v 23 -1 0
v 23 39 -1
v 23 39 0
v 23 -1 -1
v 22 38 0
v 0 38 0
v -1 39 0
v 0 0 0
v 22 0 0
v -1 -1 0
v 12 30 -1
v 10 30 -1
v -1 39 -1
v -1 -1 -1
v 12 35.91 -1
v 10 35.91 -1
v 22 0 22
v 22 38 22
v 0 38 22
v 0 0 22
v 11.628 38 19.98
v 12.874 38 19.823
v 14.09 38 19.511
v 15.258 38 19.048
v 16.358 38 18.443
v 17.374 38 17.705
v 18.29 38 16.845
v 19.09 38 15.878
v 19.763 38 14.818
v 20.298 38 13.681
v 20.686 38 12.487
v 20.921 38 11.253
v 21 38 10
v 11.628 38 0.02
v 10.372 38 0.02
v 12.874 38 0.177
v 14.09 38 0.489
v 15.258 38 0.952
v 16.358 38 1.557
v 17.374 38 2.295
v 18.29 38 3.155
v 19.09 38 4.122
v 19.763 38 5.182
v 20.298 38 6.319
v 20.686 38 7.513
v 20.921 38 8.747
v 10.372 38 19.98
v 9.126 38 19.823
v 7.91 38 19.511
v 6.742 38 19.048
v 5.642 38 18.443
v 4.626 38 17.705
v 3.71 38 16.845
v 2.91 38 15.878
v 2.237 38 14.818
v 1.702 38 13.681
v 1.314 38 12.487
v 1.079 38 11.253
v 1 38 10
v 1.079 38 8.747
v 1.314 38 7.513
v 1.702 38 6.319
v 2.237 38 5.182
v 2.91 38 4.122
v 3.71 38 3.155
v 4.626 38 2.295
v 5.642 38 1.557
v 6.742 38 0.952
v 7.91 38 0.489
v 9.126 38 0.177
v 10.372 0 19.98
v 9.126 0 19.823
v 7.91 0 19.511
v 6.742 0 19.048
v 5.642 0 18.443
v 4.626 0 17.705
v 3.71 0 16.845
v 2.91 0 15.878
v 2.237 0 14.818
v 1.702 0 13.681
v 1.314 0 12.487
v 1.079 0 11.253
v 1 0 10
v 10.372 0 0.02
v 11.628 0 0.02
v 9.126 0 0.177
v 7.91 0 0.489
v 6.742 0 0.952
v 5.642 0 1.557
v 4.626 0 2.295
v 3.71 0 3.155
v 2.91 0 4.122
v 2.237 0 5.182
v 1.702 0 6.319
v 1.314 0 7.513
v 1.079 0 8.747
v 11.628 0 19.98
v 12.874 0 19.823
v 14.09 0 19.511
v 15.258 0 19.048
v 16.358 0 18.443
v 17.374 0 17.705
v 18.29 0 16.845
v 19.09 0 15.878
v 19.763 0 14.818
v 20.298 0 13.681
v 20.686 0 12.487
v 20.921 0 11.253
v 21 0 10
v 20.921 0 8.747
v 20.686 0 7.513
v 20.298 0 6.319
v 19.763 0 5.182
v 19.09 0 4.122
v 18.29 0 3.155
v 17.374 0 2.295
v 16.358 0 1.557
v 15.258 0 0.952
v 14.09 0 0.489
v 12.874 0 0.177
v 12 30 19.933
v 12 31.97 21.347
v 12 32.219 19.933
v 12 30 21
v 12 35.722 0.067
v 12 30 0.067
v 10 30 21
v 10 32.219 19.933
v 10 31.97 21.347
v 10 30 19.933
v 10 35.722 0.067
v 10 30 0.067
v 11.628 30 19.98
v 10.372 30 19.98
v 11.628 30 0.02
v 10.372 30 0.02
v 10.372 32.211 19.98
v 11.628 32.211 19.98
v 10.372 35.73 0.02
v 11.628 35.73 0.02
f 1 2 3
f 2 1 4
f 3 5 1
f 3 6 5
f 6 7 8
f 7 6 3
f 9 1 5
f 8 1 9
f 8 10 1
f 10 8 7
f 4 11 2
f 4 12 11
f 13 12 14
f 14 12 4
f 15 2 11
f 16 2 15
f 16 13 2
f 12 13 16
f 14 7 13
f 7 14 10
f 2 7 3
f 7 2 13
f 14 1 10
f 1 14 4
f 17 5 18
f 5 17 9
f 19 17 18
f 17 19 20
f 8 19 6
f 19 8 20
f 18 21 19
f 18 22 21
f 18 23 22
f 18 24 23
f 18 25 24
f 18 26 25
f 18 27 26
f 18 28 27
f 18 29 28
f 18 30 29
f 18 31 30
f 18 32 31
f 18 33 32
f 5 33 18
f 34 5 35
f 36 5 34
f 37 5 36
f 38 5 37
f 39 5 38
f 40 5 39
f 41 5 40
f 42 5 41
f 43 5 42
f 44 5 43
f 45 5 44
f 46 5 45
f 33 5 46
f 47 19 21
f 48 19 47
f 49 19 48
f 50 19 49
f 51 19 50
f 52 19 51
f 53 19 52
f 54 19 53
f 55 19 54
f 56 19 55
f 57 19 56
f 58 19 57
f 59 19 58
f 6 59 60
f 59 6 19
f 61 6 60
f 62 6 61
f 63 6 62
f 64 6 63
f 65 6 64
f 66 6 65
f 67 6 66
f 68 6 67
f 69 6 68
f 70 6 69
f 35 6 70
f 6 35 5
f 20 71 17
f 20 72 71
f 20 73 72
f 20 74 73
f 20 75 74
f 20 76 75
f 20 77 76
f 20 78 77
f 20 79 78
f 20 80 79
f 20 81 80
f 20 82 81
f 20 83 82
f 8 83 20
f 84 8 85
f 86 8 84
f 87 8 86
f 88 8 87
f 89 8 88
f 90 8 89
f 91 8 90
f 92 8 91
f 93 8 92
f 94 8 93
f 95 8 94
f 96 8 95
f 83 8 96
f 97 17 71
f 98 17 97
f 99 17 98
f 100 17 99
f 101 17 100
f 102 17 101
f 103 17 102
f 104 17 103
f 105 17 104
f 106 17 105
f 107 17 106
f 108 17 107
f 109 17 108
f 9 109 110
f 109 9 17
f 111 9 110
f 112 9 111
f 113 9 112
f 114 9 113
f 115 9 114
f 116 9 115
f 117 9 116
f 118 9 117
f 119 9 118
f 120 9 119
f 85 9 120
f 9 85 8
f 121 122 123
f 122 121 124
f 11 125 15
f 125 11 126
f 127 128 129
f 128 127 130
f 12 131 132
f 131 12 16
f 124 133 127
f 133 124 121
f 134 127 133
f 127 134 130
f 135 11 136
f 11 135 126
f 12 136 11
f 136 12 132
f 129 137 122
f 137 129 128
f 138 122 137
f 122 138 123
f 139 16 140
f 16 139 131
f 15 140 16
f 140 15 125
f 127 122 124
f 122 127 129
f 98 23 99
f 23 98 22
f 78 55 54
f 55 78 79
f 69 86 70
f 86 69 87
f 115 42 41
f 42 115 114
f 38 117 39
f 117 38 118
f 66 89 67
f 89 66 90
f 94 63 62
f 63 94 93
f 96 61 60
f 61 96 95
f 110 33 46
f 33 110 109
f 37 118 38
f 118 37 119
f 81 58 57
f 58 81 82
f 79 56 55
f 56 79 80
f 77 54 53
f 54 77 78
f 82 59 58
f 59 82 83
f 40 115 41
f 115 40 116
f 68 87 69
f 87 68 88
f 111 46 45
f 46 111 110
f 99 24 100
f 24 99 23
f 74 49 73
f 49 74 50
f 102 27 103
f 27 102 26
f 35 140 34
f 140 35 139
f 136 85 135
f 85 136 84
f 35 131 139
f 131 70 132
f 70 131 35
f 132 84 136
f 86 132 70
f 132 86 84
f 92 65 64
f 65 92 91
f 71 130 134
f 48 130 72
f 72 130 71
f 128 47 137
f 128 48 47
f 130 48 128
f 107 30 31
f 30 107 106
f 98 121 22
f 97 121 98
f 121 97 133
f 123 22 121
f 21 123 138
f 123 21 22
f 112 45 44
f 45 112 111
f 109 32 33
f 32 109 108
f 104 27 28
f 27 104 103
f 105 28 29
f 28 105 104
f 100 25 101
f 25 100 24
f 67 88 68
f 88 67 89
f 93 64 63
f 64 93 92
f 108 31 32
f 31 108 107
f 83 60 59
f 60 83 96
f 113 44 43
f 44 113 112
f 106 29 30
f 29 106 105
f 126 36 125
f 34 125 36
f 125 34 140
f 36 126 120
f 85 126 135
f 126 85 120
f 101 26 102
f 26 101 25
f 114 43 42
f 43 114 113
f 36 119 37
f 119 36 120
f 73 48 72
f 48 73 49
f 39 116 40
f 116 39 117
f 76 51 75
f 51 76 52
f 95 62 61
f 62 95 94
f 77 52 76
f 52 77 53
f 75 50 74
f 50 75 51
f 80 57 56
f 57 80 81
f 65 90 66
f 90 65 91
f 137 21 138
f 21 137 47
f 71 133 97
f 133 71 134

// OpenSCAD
T = 1;

em_d = 20; // electromagnet
em_l = 30;

b_w = em_d + 2*T; // block
b_l = em_l + T + 7;
b_h = em_d + 2*T + 0;

r_d = 2; // rod, +1 for .5mm clearance each side
r_l = 150;

difference() {
    union() {
        translate([-T,-T,-T]) cube([b_w+2*T,b_l+2*T,T]);
        cube([b_w,b_l,b_h]);
    }
    translate([b_w/2, -1, em_d/2]) rotate([-90,0,0]) cylinder(100, em_d/2, em_d/2, $fn=50);
    
    for(d=[0:2:10]) {
        translate([b_w/2-r_d/2, em_l, b_h-1]) rotate([d,0,0])
        translate([0,0,-(b_h+r_l)]) cube([r_d, r_d, b_h+r_l]);
    }
}
